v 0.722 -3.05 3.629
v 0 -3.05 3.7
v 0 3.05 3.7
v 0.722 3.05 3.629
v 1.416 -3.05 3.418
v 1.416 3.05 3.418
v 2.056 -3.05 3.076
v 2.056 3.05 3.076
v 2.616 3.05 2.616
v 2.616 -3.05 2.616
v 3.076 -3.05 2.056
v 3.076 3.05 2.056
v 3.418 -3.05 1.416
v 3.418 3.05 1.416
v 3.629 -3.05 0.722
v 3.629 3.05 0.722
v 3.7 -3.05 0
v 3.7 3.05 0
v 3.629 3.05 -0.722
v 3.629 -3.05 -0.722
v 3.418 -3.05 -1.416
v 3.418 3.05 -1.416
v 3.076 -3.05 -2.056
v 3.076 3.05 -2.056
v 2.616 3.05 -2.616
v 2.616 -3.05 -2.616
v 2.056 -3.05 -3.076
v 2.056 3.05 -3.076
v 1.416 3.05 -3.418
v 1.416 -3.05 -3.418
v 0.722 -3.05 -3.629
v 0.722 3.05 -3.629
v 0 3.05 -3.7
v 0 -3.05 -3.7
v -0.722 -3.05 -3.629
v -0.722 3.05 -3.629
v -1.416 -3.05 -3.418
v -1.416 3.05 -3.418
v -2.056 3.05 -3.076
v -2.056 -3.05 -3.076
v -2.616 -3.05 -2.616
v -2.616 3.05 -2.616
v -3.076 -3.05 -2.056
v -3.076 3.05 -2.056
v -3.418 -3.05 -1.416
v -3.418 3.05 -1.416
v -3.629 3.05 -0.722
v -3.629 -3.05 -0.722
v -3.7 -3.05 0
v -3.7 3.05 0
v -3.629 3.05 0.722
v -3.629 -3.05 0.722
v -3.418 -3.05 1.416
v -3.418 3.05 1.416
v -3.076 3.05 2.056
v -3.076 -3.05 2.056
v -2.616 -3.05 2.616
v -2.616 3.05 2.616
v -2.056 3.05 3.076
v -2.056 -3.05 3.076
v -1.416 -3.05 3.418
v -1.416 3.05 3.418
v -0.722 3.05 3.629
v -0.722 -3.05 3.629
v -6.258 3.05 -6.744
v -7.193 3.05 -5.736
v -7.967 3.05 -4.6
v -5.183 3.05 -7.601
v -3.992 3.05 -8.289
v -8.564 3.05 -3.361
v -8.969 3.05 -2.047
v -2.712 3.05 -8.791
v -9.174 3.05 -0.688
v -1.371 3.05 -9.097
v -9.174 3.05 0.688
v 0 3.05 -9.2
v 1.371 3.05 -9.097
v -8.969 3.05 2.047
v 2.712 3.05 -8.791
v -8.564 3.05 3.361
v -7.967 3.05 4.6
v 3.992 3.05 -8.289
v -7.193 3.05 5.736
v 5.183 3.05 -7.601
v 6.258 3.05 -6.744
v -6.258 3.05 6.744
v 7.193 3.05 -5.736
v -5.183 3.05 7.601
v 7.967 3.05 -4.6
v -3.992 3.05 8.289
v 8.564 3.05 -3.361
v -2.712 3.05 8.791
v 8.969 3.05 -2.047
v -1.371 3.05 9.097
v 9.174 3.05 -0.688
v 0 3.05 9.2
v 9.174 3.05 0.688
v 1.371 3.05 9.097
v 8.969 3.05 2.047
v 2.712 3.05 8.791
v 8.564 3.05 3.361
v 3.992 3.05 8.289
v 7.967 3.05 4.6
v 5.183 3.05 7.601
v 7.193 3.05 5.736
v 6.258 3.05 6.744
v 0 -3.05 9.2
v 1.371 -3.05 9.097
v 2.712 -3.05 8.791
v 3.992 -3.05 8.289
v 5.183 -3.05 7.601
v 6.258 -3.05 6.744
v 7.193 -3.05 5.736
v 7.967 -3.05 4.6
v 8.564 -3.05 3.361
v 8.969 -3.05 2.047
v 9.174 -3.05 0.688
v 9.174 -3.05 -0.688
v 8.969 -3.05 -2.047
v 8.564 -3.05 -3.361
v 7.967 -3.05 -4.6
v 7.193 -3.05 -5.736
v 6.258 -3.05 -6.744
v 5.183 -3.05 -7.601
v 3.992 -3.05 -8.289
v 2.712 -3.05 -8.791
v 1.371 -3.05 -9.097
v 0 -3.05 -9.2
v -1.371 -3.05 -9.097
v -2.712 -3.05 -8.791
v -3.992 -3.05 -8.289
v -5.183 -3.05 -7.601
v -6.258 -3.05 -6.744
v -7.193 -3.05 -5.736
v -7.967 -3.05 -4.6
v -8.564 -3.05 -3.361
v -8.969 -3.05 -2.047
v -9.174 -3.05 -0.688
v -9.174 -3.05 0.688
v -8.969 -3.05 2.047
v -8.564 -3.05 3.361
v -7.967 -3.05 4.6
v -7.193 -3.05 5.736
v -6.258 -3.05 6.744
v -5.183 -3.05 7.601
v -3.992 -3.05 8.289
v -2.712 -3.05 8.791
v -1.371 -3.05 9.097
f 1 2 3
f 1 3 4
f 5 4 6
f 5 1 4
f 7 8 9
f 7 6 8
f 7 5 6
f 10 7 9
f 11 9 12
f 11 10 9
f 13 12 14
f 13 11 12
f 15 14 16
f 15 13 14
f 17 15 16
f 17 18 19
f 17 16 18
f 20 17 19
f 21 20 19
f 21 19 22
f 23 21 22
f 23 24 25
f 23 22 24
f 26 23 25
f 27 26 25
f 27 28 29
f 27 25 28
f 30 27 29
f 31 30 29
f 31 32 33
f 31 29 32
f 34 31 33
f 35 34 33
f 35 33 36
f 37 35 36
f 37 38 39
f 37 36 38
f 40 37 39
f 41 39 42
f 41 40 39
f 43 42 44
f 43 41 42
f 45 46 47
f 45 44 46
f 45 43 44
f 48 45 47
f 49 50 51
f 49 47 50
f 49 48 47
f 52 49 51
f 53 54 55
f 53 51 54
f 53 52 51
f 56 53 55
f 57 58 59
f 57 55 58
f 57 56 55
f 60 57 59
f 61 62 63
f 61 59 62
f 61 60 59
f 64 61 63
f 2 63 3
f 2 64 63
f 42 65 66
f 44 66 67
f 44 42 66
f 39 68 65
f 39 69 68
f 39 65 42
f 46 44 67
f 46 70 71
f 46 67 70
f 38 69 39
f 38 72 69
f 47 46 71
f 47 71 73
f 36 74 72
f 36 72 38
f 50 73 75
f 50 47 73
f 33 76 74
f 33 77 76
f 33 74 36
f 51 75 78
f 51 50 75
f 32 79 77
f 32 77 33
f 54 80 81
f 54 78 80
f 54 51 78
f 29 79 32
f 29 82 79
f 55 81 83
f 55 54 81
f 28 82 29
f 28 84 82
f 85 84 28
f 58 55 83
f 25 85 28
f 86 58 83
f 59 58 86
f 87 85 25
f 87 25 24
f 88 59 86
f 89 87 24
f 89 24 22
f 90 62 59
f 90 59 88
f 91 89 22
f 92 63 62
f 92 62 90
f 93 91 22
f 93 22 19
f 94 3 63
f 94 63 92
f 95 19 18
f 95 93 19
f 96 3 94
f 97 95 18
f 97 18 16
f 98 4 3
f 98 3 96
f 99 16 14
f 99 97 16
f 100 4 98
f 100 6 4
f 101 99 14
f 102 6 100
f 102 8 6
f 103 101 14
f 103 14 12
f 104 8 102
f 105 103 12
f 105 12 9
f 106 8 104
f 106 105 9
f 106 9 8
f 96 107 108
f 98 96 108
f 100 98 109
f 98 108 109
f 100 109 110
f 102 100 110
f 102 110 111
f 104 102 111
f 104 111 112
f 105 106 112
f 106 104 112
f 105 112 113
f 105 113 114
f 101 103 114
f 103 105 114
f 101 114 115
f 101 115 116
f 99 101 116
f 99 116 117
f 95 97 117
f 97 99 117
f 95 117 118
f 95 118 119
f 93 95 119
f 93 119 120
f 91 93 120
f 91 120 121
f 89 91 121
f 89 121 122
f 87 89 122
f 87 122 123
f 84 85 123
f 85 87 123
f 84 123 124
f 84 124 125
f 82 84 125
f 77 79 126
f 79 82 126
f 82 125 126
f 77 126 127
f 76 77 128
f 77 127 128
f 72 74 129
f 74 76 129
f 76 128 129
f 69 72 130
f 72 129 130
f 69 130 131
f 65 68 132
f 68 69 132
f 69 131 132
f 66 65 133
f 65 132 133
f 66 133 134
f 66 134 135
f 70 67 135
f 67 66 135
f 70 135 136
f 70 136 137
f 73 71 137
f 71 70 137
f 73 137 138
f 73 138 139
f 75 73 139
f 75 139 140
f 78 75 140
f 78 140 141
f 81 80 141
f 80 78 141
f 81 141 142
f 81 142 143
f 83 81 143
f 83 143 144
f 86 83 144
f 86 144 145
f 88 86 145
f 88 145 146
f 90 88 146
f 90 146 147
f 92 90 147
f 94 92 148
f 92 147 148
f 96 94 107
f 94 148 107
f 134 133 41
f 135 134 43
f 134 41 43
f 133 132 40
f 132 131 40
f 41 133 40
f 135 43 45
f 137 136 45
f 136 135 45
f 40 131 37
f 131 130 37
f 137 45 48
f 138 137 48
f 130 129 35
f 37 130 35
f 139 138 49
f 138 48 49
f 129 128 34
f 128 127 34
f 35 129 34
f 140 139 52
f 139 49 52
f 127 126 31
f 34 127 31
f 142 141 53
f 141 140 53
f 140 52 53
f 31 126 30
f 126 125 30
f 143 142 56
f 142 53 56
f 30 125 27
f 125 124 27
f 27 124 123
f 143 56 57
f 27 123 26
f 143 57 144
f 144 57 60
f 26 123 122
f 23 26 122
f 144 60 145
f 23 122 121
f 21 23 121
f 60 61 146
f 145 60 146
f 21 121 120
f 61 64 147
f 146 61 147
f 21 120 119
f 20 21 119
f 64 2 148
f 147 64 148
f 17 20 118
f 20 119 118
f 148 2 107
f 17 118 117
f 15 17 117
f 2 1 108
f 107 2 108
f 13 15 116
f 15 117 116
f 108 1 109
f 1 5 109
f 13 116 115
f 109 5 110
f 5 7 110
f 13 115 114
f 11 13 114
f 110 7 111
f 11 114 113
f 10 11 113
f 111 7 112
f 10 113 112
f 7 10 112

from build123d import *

# Parameters (mm, degrees)
SKETCH1_R               = 9.5
SKETCH1_R_2             = 3.45
BOSS_EXTRUDE1_DEPTH     = 3.05
CUT_EXTRUDE1_DEPTH      = 15.754999153
CUT_EXTRUDE1_DEPTH_BACK = 15.754999153
SKETCH2_R               = 9.5
SKETCH2_R_2             = 9.2
CUT_EXTRUDE2_DEPTH      = 15.369759914
CUT_EXTRUDE2_DEPTH_BACK = 15.369759914
SKETCH3_R               = 3.7


with BuildPart() as part:
    # Sketch1 → Boss-Extrude1 (new, symmetric)
    with BuildSketch(Plane(origin=(0, 0, 0), x_dir=(1, 0, 0), z_dir=(0, 1, 0))):
        with Locations(Location((0, 0, 0), (0, 0, 270))):
            Circle(SKETCH1_R)
        with Locations(Location((0, 0, 0), (0, 0, 270))):
            Circle(SKETCH1_R_2, mode=Mode.SUBTRACT)
    extrude(amount=BOSS_EXTRUDE1_DEPTH, both=True)

    # Sketch2 → Cut-Extrude1 (cut, two sides: drawn at the far end of the back side and taken through both)
    with BuildSketch(Plane(origin=(0, 3.05, 0), x_dir=(1, 0, 0), z_dir=(0, 1, 0)).offset(-CUT_EXTRUDE1_DEPTH_BACK)):
        Circle(SKETCH2_R)
        with Locations(Location((0, 0, 0), (0, 0, 270))):
            Circle(SKETCH2_R_2, mode=Mode.SUBTRACT)
    extrude(amount=CUT_EXTRUDE1_DEPTH + CUT_EXTRUDE1_DEPTH_BACK, mode=Mode.SUBTRACT)

    # Sketch3 → Cut-Extrude2 (cut, two sides: drawn at the far end of the back side and taken through both)
    with BuildSketch(Plane(origin=(0, 3.05, 0), x_dir=(1, 0, 0), z_dir=(0, 1, 0)).offset(-CUT_EXTRUDE2_DEPTH_BACK)):
        with Locations(Location((0, 0, 0), (0, 0, 270))):
            Circle(SKETCH3_R)
    extrude(amount=CUT_EXTRUDE2_DEPTH + CUT_EXTRUDE2_DEPTH_BACK, mode=Mode.SUBTRACT)


solid = part.part
